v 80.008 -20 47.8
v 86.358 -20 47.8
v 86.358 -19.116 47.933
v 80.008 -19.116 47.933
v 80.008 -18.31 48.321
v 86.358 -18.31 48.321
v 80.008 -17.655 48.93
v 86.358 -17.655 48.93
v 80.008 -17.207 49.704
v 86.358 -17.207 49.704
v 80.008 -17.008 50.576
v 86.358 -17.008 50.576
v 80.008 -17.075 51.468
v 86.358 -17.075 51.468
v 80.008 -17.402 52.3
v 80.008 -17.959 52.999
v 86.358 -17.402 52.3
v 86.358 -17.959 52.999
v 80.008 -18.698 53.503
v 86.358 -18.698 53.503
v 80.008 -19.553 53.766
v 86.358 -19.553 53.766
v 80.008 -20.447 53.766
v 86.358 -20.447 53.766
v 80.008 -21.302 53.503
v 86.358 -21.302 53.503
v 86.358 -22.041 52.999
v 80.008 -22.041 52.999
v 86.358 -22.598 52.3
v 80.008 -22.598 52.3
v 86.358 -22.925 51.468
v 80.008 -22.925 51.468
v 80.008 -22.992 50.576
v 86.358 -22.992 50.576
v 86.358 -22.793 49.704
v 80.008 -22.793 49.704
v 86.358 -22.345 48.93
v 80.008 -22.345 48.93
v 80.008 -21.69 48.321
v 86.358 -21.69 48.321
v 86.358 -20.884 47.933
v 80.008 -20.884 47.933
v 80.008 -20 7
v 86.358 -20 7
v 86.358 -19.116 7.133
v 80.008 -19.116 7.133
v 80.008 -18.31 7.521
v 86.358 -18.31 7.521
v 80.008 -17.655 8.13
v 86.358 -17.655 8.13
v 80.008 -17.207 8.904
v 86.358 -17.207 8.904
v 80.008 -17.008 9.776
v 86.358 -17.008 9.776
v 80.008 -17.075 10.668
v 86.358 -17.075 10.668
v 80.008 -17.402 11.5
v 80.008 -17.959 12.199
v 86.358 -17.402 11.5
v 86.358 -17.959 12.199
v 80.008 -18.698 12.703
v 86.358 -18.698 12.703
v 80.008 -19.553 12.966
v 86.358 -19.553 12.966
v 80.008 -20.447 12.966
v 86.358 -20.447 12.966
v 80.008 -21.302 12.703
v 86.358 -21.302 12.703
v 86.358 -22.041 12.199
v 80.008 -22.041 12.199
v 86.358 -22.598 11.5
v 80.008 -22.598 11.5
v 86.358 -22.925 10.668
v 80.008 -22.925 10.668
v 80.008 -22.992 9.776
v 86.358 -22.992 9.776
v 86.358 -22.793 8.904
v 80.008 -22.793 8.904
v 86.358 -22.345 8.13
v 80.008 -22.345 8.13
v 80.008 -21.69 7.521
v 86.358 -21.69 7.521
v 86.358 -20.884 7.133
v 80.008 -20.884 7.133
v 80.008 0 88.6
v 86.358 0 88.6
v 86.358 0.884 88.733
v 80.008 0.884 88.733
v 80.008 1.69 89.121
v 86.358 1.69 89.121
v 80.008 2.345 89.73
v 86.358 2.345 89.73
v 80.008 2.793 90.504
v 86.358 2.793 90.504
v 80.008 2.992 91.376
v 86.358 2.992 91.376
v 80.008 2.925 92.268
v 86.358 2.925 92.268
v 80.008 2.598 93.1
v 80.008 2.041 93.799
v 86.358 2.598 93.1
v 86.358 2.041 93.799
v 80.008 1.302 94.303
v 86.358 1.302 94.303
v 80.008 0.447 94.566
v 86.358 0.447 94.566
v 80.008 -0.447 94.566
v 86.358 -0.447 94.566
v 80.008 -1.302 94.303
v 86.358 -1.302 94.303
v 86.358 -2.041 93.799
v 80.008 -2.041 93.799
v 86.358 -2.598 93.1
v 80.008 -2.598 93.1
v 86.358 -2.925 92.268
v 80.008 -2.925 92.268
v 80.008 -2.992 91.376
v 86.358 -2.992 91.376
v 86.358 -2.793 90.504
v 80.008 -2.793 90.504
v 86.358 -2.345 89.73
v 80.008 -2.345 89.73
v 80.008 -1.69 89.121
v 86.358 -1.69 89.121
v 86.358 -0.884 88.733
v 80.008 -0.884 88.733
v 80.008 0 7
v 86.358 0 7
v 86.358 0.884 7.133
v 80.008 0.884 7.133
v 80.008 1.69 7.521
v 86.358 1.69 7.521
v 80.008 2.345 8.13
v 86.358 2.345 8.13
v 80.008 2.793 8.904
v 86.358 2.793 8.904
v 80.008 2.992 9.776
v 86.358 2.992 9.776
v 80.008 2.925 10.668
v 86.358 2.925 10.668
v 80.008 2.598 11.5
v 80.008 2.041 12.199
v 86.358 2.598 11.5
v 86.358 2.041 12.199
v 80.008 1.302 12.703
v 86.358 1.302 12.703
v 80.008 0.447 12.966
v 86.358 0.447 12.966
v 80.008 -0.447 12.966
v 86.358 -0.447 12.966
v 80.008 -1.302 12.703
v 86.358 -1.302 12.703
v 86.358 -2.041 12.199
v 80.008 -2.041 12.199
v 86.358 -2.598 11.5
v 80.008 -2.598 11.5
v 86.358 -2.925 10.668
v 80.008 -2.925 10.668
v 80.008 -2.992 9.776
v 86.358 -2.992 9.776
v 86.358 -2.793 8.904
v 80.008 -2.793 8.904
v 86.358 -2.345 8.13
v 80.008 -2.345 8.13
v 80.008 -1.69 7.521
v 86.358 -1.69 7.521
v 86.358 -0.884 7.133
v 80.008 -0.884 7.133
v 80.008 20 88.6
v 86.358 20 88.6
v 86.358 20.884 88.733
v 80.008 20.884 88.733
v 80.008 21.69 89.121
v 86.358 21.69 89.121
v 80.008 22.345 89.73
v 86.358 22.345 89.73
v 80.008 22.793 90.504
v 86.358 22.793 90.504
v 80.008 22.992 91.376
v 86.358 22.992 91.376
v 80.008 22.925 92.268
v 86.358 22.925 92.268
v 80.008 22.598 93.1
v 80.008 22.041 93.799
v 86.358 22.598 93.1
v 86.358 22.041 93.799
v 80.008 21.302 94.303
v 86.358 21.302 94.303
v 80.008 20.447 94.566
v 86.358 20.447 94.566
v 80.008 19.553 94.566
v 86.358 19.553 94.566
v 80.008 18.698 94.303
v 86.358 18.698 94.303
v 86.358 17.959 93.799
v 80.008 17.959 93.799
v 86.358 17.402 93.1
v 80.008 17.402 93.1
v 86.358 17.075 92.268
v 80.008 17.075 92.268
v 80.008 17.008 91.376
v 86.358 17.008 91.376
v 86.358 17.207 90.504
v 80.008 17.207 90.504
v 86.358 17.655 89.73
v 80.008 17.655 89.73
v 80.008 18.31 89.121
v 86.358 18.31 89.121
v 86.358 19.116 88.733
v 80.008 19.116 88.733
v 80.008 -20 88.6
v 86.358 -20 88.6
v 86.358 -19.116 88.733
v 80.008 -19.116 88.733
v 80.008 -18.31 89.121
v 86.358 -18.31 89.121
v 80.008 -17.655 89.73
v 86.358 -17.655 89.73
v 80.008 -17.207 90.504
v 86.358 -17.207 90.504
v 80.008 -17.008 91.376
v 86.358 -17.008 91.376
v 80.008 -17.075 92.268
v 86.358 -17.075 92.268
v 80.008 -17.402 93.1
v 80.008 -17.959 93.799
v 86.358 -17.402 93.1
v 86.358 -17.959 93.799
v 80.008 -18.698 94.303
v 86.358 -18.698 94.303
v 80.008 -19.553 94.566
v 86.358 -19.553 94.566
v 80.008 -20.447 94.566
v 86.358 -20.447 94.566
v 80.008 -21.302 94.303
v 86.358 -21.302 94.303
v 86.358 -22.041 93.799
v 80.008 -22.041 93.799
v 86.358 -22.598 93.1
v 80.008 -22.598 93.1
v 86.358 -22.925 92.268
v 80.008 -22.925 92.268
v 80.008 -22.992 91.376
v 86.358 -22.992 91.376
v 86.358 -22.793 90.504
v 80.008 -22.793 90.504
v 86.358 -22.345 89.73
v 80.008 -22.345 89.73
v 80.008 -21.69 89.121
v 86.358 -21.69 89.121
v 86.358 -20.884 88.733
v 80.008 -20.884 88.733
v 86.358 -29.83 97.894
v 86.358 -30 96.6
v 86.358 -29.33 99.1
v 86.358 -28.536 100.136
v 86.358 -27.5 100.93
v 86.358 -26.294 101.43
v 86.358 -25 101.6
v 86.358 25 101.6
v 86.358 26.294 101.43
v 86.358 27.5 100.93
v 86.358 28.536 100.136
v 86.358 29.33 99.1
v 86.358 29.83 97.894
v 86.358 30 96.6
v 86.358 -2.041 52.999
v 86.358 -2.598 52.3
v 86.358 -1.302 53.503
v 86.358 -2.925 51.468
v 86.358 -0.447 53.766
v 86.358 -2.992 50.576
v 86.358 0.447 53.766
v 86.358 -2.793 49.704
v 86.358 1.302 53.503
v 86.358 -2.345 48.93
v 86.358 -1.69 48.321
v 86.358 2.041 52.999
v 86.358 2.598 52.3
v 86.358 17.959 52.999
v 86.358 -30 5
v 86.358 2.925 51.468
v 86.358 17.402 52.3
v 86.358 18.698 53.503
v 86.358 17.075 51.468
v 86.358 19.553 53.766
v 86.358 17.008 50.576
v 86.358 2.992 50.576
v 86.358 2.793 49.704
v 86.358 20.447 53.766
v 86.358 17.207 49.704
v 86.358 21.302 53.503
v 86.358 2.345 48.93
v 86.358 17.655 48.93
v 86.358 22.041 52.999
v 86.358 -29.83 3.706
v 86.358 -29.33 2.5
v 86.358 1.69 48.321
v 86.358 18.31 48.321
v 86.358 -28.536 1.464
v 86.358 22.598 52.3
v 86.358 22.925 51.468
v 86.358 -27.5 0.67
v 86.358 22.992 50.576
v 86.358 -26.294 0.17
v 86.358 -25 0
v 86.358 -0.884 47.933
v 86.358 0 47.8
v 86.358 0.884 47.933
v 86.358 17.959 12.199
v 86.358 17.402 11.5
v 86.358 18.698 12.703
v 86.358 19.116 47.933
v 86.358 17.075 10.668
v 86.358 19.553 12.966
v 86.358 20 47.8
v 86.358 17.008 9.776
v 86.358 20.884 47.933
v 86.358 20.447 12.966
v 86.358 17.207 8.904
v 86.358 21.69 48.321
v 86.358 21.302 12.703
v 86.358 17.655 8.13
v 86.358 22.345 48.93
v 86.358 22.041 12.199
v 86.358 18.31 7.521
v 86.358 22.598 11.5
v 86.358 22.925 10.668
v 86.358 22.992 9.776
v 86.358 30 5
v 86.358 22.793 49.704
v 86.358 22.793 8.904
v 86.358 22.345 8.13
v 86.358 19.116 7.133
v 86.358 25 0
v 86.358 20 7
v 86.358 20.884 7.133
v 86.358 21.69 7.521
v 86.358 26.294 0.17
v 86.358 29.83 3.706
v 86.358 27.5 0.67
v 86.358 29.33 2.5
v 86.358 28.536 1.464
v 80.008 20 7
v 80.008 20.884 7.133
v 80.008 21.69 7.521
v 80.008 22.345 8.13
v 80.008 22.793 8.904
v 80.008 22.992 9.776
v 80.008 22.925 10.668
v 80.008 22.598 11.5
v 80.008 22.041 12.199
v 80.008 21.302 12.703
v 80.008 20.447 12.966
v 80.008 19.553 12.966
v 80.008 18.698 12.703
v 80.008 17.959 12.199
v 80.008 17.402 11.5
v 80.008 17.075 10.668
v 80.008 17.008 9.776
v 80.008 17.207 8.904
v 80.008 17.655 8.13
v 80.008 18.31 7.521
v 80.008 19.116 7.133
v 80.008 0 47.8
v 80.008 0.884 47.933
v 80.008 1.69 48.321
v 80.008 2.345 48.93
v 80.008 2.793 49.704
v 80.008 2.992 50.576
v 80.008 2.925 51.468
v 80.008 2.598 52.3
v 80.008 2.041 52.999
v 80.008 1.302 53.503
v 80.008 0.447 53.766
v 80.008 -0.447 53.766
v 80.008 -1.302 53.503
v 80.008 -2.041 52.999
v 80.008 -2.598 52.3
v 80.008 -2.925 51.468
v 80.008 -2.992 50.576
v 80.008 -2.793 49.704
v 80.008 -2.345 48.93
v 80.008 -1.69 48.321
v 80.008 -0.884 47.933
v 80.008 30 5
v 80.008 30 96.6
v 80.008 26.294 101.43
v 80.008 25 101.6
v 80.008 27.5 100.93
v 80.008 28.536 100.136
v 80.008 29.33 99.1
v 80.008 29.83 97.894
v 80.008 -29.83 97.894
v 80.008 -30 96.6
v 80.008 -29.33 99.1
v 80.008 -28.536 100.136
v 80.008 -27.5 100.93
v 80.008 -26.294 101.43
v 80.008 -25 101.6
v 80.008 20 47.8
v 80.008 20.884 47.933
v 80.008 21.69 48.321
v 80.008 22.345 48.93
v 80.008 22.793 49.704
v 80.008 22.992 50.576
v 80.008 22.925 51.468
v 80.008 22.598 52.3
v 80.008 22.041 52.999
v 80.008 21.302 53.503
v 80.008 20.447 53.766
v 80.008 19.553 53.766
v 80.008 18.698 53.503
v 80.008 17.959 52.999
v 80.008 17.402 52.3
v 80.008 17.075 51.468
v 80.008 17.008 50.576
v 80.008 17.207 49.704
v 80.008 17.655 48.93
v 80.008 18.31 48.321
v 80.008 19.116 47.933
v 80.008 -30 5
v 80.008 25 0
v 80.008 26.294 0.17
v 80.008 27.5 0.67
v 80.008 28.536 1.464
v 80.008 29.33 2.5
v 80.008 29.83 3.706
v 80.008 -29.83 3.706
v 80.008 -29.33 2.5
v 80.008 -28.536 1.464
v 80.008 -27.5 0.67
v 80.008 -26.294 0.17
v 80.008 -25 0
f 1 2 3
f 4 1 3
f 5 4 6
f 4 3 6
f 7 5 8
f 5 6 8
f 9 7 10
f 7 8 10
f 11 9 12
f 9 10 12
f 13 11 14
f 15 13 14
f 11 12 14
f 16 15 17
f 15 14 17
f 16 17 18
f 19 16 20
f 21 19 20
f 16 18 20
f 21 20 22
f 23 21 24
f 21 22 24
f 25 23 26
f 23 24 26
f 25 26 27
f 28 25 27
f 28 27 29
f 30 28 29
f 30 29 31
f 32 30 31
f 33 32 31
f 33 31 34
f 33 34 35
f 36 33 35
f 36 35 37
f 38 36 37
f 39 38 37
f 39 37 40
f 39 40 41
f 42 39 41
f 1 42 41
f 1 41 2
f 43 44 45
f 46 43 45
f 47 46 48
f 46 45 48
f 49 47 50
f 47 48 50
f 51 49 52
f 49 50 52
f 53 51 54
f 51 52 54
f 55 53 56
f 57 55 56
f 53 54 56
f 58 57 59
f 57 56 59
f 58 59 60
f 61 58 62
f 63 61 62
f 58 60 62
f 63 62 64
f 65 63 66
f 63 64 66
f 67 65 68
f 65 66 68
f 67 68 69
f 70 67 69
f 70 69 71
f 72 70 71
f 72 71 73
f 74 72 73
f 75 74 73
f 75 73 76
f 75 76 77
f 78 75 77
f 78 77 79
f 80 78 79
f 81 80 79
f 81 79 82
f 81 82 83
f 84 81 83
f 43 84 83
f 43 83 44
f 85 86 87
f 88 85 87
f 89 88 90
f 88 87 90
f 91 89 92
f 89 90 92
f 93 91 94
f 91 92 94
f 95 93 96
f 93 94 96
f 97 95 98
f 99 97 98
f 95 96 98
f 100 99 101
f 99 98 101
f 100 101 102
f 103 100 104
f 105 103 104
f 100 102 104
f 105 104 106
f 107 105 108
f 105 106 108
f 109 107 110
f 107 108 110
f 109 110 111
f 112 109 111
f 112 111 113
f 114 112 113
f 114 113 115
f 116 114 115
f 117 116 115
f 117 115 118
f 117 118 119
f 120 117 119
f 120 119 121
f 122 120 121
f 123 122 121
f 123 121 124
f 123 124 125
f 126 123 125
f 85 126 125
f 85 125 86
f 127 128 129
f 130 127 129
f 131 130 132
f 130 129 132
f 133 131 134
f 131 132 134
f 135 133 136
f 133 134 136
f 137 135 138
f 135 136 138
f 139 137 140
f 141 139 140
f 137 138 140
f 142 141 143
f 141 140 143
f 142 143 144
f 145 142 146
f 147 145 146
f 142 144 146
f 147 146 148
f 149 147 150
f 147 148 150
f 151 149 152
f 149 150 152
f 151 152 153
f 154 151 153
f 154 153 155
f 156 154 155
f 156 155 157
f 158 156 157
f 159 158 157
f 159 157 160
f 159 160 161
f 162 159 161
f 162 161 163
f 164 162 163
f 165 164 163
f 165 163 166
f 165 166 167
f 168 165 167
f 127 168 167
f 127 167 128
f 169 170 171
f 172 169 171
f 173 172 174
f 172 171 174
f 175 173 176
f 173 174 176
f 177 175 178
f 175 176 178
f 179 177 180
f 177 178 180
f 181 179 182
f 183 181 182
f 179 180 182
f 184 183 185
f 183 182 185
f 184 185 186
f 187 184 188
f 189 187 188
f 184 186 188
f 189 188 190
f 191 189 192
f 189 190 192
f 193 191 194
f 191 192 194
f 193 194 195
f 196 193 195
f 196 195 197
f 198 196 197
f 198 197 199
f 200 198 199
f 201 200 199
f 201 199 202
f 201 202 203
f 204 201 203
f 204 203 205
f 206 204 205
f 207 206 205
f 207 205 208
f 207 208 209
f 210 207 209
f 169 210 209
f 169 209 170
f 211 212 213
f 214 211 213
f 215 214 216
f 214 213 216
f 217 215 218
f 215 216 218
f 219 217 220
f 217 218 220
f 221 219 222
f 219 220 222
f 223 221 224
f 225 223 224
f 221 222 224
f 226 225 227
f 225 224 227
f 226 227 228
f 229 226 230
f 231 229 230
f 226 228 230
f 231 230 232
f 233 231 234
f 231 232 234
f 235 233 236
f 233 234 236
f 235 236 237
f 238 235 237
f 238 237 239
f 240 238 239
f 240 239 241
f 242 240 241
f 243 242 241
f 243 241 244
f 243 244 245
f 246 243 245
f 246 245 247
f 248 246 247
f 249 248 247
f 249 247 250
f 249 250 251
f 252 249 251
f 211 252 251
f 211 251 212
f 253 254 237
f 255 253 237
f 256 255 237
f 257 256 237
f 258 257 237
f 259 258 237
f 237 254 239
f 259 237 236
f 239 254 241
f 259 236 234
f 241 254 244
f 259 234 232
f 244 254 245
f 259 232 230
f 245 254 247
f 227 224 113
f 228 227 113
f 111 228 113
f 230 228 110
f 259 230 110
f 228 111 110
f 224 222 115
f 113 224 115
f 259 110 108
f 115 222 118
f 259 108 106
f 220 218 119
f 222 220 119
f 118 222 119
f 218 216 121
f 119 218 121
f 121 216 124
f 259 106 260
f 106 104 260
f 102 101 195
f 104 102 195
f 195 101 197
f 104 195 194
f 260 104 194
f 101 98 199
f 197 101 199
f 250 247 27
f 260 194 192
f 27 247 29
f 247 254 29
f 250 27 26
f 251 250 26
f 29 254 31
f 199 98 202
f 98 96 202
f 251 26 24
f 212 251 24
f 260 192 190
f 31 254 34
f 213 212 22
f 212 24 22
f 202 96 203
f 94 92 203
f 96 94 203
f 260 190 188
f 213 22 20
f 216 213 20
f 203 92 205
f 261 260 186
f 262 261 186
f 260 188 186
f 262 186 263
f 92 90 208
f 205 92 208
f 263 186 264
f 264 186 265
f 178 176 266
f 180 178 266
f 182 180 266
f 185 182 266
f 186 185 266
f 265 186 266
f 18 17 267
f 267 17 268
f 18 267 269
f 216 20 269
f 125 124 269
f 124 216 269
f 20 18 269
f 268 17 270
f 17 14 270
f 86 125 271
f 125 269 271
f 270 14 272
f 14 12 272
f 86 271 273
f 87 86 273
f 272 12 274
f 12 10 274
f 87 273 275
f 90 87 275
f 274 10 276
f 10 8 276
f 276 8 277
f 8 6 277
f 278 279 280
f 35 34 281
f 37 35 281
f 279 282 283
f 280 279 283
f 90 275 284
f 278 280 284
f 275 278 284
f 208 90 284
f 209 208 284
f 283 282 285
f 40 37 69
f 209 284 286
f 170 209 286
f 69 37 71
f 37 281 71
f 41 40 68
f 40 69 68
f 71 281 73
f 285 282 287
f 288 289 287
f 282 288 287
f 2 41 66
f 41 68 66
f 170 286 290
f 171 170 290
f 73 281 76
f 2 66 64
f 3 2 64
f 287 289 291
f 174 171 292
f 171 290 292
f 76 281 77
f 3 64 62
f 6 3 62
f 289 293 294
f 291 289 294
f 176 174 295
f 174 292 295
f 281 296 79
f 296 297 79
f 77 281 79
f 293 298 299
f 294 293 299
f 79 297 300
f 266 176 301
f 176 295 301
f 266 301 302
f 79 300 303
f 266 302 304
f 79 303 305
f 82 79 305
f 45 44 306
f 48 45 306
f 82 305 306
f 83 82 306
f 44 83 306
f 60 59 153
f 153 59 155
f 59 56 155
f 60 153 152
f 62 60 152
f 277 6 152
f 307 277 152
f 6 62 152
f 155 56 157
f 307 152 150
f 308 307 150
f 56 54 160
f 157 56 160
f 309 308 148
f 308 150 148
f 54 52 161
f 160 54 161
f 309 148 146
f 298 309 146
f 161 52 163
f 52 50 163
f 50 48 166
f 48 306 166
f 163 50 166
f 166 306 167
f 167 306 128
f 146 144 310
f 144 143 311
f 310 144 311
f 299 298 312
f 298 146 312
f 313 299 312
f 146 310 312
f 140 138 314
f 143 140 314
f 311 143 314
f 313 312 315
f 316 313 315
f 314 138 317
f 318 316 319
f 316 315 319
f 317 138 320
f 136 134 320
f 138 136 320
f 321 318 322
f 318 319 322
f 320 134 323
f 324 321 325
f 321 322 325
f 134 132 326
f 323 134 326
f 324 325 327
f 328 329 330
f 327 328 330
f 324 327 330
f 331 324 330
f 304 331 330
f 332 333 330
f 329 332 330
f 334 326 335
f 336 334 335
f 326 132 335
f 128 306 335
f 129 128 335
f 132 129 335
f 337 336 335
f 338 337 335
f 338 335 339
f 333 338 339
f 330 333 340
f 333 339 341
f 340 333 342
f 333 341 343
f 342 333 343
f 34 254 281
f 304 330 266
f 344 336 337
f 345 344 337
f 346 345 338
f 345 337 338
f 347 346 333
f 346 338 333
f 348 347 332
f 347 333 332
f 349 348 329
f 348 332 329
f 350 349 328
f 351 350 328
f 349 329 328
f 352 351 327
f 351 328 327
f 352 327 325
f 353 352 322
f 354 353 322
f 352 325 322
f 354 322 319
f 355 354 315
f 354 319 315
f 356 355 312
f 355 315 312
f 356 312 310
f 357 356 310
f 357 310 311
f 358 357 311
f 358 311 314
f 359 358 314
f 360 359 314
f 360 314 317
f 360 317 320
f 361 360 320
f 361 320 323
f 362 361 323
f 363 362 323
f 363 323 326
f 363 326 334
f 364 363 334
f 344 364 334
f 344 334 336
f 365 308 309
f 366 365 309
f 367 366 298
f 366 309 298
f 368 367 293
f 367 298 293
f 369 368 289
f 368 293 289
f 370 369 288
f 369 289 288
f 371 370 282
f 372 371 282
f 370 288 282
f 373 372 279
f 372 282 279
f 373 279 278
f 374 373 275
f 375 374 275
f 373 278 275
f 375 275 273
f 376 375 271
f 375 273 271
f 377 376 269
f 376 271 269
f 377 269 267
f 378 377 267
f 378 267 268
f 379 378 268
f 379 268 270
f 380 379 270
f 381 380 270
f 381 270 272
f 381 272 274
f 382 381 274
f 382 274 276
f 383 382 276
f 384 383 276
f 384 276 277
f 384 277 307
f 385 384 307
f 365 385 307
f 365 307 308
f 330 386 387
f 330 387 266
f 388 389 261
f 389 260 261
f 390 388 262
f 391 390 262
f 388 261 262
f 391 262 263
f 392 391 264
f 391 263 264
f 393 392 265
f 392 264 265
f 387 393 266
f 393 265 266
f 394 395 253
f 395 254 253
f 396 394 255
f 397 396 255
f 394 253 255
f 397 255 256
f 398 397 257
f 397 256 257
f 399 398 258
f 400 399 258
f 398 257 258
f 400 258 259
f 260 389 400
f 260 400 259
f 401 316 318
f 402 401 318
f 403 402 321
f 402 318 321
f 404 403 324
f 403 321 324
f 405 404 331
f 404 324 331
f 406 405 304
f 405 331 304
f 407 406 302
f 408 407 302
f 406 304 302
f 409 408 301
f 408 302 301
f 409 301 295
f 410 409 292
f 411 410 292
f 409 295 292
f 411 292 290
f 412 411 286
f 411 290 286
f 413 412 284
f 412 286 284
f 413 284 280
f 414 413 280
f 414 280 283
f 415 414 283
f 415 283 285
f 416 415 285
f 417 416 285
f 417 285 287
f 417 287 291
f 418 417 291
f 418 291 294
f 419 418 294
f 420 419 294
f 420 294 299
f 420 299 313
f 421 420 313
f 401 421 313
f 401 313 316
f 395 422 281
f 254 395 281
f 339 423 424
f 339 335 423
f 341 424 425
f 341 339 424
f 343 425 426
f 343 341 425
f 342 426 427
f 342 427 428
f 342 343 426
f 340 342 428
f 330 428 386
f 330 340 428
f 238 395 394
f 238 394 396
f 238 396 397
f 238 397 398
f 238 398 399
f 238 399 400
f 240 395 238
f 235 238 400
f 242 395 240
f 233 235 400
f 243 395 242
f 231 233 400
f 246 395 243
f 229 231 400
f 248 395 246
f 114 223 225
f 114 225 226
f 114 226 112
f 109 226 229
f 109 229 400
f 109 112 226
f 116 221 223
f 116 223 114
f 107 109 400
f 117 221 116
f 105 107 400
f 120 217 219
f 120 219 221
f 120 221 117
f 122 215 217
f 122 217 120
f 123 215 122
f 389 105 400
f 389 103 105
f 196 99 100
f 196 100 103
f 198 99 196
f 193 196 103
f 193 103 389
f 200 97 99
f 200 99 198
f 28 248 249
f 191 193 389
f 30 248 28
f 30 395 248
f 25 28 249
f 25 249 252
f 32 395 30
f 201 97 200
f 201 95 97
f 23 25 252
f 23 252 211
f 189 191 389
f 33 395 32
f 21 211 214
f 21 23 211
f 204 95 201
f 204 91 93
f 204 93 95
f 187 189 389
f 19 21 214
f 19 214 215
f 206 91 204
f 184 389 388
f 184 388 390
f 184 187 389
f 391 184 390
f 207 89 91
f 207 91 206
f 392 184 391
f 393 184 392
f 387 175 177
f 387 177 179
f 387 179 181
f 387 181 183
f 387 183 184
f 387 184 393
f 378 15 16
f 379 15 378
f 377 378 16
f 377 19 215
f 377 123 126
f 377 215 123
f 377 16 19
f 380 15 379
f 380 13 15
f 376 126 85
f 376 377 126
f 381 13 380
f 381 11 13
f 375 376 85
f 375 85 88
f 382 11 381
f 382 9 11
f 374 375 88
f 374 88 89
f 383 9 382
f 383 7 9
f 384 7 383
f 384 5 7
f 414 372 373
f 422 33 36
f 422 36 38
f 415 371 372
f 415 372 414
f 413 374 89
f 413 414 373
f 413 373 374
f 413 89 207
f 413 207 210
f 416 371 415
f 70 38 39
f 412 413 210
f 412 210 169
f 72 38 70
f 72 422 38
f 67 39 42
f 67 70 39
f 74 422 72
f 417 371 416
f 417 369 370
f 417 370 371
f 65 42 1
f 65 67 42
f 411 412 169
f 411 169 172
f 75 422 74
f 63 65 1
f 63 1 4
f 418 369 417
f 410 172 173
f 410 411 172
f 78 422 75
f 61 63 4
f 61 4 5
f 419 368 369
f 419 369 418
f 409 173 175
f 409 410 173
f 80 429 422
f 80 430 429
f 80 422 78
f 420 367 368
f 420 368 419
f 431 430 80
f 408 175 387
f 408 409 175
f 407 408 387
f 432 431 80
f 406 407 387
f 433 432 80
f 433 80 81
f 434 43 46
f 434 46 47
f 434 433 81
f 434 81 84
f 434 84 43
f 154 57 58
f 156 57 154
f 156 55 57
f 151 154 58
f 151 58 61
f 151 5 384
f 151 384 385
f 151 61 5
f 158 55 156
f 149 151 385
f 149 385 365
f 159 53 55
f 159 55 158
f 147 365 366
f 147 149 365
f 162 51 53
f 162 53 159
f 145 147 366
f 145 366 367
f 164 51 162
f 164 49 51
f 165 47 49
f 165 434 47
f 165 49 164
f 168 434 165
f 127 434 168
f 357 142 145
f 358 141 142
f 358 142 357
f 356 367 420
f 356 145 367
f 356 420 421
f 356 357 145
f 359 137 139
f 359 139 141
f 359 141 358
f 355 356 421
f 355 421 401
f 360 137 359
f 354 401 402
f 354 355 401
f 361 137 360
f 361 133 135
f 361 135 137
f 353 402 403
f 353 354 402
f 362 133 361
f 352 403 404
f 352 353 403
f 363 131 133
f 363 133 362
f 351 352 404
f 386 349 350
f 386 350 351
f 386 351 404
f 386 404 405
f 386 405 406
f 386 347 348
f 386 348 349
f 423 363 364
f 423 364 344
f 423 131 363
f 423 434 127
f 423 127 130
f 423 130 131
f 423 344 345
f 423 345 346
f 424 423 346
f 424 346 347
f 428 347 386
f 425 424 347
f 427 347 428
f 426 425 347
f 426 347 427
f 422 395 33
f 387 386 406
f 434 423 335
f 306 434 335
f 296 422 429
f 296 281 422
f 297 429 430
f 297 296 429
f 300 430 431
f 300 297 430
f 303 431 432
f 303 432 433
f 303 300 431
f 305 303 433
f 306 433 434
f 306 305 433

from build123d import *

# Parameters (mm, degrees)
SKETCH1_W           = 6.35
SKETCH1_H           = 60
BOSS_EXTRUDE1_DEPTH = 101.6
SKETCH2_R           = 3
CUT_EXTRUDE1_DEPTH  = 10
FILLET1_R           = 5


with BuildPart() as part:
    # Sketch1 → Boss-Extrude1 (new body)
    with BuildSketch(Plane.XY):
        with Locations((83.183251365, 0)):
            Rectangle(SKETCH1_W, SKETCH1_H)
    extrude(amount=BOSS_EXTRUDE1_DEPTH)

    # Sketch2 → Cut-Extrude1 (cut)
    with BuildSketch(Plane(origin=(86.358251365, 0, 0), x_dir=(0, 0, -1), z_dir=(1, 0, 0))):
        with Locations((-10, -20)):
            Circle(SKETCH2_R)
        with Locations((-10, 20)):
            Circle(SKETCH2_R)
        with Locations((-10, 0)):
            Circle(SKETCH2_R)
        with Locations((-50.8, 20)):
            Circle(SKETCH2_R)
        with Locations((-50.8, 0)):
            Circle(SKETCH2_R)
        with Locations((-50.8, -20)):
            Circle(SKETCH2_R)
        with Locations((-91.6, -20)):
            Circle(SKETCH2_R)
        with Locations((-91.6, 0)):
            Circle(SKETCH2_R)
        with Locations((-91.6, 20)):
            Circle(SKETCH2_R)
    extrude(amount=-CUT_EXTRUDE1_DEPTH, mode=Mode.SUBTRACT)

    # Fillet1
    fillet1_edges = [part.edges().sort_by_distance(p)[0] for p in [
        (83.183251365, 30, 101.6),
        (83.183251365, 30, 0),
        (83.183251365, -30, 0),
        (83.183251365, -30, 101.6),
    ]]
    fillet(fillet1_edges, radius=FILLET1_R)


solid = part.part
